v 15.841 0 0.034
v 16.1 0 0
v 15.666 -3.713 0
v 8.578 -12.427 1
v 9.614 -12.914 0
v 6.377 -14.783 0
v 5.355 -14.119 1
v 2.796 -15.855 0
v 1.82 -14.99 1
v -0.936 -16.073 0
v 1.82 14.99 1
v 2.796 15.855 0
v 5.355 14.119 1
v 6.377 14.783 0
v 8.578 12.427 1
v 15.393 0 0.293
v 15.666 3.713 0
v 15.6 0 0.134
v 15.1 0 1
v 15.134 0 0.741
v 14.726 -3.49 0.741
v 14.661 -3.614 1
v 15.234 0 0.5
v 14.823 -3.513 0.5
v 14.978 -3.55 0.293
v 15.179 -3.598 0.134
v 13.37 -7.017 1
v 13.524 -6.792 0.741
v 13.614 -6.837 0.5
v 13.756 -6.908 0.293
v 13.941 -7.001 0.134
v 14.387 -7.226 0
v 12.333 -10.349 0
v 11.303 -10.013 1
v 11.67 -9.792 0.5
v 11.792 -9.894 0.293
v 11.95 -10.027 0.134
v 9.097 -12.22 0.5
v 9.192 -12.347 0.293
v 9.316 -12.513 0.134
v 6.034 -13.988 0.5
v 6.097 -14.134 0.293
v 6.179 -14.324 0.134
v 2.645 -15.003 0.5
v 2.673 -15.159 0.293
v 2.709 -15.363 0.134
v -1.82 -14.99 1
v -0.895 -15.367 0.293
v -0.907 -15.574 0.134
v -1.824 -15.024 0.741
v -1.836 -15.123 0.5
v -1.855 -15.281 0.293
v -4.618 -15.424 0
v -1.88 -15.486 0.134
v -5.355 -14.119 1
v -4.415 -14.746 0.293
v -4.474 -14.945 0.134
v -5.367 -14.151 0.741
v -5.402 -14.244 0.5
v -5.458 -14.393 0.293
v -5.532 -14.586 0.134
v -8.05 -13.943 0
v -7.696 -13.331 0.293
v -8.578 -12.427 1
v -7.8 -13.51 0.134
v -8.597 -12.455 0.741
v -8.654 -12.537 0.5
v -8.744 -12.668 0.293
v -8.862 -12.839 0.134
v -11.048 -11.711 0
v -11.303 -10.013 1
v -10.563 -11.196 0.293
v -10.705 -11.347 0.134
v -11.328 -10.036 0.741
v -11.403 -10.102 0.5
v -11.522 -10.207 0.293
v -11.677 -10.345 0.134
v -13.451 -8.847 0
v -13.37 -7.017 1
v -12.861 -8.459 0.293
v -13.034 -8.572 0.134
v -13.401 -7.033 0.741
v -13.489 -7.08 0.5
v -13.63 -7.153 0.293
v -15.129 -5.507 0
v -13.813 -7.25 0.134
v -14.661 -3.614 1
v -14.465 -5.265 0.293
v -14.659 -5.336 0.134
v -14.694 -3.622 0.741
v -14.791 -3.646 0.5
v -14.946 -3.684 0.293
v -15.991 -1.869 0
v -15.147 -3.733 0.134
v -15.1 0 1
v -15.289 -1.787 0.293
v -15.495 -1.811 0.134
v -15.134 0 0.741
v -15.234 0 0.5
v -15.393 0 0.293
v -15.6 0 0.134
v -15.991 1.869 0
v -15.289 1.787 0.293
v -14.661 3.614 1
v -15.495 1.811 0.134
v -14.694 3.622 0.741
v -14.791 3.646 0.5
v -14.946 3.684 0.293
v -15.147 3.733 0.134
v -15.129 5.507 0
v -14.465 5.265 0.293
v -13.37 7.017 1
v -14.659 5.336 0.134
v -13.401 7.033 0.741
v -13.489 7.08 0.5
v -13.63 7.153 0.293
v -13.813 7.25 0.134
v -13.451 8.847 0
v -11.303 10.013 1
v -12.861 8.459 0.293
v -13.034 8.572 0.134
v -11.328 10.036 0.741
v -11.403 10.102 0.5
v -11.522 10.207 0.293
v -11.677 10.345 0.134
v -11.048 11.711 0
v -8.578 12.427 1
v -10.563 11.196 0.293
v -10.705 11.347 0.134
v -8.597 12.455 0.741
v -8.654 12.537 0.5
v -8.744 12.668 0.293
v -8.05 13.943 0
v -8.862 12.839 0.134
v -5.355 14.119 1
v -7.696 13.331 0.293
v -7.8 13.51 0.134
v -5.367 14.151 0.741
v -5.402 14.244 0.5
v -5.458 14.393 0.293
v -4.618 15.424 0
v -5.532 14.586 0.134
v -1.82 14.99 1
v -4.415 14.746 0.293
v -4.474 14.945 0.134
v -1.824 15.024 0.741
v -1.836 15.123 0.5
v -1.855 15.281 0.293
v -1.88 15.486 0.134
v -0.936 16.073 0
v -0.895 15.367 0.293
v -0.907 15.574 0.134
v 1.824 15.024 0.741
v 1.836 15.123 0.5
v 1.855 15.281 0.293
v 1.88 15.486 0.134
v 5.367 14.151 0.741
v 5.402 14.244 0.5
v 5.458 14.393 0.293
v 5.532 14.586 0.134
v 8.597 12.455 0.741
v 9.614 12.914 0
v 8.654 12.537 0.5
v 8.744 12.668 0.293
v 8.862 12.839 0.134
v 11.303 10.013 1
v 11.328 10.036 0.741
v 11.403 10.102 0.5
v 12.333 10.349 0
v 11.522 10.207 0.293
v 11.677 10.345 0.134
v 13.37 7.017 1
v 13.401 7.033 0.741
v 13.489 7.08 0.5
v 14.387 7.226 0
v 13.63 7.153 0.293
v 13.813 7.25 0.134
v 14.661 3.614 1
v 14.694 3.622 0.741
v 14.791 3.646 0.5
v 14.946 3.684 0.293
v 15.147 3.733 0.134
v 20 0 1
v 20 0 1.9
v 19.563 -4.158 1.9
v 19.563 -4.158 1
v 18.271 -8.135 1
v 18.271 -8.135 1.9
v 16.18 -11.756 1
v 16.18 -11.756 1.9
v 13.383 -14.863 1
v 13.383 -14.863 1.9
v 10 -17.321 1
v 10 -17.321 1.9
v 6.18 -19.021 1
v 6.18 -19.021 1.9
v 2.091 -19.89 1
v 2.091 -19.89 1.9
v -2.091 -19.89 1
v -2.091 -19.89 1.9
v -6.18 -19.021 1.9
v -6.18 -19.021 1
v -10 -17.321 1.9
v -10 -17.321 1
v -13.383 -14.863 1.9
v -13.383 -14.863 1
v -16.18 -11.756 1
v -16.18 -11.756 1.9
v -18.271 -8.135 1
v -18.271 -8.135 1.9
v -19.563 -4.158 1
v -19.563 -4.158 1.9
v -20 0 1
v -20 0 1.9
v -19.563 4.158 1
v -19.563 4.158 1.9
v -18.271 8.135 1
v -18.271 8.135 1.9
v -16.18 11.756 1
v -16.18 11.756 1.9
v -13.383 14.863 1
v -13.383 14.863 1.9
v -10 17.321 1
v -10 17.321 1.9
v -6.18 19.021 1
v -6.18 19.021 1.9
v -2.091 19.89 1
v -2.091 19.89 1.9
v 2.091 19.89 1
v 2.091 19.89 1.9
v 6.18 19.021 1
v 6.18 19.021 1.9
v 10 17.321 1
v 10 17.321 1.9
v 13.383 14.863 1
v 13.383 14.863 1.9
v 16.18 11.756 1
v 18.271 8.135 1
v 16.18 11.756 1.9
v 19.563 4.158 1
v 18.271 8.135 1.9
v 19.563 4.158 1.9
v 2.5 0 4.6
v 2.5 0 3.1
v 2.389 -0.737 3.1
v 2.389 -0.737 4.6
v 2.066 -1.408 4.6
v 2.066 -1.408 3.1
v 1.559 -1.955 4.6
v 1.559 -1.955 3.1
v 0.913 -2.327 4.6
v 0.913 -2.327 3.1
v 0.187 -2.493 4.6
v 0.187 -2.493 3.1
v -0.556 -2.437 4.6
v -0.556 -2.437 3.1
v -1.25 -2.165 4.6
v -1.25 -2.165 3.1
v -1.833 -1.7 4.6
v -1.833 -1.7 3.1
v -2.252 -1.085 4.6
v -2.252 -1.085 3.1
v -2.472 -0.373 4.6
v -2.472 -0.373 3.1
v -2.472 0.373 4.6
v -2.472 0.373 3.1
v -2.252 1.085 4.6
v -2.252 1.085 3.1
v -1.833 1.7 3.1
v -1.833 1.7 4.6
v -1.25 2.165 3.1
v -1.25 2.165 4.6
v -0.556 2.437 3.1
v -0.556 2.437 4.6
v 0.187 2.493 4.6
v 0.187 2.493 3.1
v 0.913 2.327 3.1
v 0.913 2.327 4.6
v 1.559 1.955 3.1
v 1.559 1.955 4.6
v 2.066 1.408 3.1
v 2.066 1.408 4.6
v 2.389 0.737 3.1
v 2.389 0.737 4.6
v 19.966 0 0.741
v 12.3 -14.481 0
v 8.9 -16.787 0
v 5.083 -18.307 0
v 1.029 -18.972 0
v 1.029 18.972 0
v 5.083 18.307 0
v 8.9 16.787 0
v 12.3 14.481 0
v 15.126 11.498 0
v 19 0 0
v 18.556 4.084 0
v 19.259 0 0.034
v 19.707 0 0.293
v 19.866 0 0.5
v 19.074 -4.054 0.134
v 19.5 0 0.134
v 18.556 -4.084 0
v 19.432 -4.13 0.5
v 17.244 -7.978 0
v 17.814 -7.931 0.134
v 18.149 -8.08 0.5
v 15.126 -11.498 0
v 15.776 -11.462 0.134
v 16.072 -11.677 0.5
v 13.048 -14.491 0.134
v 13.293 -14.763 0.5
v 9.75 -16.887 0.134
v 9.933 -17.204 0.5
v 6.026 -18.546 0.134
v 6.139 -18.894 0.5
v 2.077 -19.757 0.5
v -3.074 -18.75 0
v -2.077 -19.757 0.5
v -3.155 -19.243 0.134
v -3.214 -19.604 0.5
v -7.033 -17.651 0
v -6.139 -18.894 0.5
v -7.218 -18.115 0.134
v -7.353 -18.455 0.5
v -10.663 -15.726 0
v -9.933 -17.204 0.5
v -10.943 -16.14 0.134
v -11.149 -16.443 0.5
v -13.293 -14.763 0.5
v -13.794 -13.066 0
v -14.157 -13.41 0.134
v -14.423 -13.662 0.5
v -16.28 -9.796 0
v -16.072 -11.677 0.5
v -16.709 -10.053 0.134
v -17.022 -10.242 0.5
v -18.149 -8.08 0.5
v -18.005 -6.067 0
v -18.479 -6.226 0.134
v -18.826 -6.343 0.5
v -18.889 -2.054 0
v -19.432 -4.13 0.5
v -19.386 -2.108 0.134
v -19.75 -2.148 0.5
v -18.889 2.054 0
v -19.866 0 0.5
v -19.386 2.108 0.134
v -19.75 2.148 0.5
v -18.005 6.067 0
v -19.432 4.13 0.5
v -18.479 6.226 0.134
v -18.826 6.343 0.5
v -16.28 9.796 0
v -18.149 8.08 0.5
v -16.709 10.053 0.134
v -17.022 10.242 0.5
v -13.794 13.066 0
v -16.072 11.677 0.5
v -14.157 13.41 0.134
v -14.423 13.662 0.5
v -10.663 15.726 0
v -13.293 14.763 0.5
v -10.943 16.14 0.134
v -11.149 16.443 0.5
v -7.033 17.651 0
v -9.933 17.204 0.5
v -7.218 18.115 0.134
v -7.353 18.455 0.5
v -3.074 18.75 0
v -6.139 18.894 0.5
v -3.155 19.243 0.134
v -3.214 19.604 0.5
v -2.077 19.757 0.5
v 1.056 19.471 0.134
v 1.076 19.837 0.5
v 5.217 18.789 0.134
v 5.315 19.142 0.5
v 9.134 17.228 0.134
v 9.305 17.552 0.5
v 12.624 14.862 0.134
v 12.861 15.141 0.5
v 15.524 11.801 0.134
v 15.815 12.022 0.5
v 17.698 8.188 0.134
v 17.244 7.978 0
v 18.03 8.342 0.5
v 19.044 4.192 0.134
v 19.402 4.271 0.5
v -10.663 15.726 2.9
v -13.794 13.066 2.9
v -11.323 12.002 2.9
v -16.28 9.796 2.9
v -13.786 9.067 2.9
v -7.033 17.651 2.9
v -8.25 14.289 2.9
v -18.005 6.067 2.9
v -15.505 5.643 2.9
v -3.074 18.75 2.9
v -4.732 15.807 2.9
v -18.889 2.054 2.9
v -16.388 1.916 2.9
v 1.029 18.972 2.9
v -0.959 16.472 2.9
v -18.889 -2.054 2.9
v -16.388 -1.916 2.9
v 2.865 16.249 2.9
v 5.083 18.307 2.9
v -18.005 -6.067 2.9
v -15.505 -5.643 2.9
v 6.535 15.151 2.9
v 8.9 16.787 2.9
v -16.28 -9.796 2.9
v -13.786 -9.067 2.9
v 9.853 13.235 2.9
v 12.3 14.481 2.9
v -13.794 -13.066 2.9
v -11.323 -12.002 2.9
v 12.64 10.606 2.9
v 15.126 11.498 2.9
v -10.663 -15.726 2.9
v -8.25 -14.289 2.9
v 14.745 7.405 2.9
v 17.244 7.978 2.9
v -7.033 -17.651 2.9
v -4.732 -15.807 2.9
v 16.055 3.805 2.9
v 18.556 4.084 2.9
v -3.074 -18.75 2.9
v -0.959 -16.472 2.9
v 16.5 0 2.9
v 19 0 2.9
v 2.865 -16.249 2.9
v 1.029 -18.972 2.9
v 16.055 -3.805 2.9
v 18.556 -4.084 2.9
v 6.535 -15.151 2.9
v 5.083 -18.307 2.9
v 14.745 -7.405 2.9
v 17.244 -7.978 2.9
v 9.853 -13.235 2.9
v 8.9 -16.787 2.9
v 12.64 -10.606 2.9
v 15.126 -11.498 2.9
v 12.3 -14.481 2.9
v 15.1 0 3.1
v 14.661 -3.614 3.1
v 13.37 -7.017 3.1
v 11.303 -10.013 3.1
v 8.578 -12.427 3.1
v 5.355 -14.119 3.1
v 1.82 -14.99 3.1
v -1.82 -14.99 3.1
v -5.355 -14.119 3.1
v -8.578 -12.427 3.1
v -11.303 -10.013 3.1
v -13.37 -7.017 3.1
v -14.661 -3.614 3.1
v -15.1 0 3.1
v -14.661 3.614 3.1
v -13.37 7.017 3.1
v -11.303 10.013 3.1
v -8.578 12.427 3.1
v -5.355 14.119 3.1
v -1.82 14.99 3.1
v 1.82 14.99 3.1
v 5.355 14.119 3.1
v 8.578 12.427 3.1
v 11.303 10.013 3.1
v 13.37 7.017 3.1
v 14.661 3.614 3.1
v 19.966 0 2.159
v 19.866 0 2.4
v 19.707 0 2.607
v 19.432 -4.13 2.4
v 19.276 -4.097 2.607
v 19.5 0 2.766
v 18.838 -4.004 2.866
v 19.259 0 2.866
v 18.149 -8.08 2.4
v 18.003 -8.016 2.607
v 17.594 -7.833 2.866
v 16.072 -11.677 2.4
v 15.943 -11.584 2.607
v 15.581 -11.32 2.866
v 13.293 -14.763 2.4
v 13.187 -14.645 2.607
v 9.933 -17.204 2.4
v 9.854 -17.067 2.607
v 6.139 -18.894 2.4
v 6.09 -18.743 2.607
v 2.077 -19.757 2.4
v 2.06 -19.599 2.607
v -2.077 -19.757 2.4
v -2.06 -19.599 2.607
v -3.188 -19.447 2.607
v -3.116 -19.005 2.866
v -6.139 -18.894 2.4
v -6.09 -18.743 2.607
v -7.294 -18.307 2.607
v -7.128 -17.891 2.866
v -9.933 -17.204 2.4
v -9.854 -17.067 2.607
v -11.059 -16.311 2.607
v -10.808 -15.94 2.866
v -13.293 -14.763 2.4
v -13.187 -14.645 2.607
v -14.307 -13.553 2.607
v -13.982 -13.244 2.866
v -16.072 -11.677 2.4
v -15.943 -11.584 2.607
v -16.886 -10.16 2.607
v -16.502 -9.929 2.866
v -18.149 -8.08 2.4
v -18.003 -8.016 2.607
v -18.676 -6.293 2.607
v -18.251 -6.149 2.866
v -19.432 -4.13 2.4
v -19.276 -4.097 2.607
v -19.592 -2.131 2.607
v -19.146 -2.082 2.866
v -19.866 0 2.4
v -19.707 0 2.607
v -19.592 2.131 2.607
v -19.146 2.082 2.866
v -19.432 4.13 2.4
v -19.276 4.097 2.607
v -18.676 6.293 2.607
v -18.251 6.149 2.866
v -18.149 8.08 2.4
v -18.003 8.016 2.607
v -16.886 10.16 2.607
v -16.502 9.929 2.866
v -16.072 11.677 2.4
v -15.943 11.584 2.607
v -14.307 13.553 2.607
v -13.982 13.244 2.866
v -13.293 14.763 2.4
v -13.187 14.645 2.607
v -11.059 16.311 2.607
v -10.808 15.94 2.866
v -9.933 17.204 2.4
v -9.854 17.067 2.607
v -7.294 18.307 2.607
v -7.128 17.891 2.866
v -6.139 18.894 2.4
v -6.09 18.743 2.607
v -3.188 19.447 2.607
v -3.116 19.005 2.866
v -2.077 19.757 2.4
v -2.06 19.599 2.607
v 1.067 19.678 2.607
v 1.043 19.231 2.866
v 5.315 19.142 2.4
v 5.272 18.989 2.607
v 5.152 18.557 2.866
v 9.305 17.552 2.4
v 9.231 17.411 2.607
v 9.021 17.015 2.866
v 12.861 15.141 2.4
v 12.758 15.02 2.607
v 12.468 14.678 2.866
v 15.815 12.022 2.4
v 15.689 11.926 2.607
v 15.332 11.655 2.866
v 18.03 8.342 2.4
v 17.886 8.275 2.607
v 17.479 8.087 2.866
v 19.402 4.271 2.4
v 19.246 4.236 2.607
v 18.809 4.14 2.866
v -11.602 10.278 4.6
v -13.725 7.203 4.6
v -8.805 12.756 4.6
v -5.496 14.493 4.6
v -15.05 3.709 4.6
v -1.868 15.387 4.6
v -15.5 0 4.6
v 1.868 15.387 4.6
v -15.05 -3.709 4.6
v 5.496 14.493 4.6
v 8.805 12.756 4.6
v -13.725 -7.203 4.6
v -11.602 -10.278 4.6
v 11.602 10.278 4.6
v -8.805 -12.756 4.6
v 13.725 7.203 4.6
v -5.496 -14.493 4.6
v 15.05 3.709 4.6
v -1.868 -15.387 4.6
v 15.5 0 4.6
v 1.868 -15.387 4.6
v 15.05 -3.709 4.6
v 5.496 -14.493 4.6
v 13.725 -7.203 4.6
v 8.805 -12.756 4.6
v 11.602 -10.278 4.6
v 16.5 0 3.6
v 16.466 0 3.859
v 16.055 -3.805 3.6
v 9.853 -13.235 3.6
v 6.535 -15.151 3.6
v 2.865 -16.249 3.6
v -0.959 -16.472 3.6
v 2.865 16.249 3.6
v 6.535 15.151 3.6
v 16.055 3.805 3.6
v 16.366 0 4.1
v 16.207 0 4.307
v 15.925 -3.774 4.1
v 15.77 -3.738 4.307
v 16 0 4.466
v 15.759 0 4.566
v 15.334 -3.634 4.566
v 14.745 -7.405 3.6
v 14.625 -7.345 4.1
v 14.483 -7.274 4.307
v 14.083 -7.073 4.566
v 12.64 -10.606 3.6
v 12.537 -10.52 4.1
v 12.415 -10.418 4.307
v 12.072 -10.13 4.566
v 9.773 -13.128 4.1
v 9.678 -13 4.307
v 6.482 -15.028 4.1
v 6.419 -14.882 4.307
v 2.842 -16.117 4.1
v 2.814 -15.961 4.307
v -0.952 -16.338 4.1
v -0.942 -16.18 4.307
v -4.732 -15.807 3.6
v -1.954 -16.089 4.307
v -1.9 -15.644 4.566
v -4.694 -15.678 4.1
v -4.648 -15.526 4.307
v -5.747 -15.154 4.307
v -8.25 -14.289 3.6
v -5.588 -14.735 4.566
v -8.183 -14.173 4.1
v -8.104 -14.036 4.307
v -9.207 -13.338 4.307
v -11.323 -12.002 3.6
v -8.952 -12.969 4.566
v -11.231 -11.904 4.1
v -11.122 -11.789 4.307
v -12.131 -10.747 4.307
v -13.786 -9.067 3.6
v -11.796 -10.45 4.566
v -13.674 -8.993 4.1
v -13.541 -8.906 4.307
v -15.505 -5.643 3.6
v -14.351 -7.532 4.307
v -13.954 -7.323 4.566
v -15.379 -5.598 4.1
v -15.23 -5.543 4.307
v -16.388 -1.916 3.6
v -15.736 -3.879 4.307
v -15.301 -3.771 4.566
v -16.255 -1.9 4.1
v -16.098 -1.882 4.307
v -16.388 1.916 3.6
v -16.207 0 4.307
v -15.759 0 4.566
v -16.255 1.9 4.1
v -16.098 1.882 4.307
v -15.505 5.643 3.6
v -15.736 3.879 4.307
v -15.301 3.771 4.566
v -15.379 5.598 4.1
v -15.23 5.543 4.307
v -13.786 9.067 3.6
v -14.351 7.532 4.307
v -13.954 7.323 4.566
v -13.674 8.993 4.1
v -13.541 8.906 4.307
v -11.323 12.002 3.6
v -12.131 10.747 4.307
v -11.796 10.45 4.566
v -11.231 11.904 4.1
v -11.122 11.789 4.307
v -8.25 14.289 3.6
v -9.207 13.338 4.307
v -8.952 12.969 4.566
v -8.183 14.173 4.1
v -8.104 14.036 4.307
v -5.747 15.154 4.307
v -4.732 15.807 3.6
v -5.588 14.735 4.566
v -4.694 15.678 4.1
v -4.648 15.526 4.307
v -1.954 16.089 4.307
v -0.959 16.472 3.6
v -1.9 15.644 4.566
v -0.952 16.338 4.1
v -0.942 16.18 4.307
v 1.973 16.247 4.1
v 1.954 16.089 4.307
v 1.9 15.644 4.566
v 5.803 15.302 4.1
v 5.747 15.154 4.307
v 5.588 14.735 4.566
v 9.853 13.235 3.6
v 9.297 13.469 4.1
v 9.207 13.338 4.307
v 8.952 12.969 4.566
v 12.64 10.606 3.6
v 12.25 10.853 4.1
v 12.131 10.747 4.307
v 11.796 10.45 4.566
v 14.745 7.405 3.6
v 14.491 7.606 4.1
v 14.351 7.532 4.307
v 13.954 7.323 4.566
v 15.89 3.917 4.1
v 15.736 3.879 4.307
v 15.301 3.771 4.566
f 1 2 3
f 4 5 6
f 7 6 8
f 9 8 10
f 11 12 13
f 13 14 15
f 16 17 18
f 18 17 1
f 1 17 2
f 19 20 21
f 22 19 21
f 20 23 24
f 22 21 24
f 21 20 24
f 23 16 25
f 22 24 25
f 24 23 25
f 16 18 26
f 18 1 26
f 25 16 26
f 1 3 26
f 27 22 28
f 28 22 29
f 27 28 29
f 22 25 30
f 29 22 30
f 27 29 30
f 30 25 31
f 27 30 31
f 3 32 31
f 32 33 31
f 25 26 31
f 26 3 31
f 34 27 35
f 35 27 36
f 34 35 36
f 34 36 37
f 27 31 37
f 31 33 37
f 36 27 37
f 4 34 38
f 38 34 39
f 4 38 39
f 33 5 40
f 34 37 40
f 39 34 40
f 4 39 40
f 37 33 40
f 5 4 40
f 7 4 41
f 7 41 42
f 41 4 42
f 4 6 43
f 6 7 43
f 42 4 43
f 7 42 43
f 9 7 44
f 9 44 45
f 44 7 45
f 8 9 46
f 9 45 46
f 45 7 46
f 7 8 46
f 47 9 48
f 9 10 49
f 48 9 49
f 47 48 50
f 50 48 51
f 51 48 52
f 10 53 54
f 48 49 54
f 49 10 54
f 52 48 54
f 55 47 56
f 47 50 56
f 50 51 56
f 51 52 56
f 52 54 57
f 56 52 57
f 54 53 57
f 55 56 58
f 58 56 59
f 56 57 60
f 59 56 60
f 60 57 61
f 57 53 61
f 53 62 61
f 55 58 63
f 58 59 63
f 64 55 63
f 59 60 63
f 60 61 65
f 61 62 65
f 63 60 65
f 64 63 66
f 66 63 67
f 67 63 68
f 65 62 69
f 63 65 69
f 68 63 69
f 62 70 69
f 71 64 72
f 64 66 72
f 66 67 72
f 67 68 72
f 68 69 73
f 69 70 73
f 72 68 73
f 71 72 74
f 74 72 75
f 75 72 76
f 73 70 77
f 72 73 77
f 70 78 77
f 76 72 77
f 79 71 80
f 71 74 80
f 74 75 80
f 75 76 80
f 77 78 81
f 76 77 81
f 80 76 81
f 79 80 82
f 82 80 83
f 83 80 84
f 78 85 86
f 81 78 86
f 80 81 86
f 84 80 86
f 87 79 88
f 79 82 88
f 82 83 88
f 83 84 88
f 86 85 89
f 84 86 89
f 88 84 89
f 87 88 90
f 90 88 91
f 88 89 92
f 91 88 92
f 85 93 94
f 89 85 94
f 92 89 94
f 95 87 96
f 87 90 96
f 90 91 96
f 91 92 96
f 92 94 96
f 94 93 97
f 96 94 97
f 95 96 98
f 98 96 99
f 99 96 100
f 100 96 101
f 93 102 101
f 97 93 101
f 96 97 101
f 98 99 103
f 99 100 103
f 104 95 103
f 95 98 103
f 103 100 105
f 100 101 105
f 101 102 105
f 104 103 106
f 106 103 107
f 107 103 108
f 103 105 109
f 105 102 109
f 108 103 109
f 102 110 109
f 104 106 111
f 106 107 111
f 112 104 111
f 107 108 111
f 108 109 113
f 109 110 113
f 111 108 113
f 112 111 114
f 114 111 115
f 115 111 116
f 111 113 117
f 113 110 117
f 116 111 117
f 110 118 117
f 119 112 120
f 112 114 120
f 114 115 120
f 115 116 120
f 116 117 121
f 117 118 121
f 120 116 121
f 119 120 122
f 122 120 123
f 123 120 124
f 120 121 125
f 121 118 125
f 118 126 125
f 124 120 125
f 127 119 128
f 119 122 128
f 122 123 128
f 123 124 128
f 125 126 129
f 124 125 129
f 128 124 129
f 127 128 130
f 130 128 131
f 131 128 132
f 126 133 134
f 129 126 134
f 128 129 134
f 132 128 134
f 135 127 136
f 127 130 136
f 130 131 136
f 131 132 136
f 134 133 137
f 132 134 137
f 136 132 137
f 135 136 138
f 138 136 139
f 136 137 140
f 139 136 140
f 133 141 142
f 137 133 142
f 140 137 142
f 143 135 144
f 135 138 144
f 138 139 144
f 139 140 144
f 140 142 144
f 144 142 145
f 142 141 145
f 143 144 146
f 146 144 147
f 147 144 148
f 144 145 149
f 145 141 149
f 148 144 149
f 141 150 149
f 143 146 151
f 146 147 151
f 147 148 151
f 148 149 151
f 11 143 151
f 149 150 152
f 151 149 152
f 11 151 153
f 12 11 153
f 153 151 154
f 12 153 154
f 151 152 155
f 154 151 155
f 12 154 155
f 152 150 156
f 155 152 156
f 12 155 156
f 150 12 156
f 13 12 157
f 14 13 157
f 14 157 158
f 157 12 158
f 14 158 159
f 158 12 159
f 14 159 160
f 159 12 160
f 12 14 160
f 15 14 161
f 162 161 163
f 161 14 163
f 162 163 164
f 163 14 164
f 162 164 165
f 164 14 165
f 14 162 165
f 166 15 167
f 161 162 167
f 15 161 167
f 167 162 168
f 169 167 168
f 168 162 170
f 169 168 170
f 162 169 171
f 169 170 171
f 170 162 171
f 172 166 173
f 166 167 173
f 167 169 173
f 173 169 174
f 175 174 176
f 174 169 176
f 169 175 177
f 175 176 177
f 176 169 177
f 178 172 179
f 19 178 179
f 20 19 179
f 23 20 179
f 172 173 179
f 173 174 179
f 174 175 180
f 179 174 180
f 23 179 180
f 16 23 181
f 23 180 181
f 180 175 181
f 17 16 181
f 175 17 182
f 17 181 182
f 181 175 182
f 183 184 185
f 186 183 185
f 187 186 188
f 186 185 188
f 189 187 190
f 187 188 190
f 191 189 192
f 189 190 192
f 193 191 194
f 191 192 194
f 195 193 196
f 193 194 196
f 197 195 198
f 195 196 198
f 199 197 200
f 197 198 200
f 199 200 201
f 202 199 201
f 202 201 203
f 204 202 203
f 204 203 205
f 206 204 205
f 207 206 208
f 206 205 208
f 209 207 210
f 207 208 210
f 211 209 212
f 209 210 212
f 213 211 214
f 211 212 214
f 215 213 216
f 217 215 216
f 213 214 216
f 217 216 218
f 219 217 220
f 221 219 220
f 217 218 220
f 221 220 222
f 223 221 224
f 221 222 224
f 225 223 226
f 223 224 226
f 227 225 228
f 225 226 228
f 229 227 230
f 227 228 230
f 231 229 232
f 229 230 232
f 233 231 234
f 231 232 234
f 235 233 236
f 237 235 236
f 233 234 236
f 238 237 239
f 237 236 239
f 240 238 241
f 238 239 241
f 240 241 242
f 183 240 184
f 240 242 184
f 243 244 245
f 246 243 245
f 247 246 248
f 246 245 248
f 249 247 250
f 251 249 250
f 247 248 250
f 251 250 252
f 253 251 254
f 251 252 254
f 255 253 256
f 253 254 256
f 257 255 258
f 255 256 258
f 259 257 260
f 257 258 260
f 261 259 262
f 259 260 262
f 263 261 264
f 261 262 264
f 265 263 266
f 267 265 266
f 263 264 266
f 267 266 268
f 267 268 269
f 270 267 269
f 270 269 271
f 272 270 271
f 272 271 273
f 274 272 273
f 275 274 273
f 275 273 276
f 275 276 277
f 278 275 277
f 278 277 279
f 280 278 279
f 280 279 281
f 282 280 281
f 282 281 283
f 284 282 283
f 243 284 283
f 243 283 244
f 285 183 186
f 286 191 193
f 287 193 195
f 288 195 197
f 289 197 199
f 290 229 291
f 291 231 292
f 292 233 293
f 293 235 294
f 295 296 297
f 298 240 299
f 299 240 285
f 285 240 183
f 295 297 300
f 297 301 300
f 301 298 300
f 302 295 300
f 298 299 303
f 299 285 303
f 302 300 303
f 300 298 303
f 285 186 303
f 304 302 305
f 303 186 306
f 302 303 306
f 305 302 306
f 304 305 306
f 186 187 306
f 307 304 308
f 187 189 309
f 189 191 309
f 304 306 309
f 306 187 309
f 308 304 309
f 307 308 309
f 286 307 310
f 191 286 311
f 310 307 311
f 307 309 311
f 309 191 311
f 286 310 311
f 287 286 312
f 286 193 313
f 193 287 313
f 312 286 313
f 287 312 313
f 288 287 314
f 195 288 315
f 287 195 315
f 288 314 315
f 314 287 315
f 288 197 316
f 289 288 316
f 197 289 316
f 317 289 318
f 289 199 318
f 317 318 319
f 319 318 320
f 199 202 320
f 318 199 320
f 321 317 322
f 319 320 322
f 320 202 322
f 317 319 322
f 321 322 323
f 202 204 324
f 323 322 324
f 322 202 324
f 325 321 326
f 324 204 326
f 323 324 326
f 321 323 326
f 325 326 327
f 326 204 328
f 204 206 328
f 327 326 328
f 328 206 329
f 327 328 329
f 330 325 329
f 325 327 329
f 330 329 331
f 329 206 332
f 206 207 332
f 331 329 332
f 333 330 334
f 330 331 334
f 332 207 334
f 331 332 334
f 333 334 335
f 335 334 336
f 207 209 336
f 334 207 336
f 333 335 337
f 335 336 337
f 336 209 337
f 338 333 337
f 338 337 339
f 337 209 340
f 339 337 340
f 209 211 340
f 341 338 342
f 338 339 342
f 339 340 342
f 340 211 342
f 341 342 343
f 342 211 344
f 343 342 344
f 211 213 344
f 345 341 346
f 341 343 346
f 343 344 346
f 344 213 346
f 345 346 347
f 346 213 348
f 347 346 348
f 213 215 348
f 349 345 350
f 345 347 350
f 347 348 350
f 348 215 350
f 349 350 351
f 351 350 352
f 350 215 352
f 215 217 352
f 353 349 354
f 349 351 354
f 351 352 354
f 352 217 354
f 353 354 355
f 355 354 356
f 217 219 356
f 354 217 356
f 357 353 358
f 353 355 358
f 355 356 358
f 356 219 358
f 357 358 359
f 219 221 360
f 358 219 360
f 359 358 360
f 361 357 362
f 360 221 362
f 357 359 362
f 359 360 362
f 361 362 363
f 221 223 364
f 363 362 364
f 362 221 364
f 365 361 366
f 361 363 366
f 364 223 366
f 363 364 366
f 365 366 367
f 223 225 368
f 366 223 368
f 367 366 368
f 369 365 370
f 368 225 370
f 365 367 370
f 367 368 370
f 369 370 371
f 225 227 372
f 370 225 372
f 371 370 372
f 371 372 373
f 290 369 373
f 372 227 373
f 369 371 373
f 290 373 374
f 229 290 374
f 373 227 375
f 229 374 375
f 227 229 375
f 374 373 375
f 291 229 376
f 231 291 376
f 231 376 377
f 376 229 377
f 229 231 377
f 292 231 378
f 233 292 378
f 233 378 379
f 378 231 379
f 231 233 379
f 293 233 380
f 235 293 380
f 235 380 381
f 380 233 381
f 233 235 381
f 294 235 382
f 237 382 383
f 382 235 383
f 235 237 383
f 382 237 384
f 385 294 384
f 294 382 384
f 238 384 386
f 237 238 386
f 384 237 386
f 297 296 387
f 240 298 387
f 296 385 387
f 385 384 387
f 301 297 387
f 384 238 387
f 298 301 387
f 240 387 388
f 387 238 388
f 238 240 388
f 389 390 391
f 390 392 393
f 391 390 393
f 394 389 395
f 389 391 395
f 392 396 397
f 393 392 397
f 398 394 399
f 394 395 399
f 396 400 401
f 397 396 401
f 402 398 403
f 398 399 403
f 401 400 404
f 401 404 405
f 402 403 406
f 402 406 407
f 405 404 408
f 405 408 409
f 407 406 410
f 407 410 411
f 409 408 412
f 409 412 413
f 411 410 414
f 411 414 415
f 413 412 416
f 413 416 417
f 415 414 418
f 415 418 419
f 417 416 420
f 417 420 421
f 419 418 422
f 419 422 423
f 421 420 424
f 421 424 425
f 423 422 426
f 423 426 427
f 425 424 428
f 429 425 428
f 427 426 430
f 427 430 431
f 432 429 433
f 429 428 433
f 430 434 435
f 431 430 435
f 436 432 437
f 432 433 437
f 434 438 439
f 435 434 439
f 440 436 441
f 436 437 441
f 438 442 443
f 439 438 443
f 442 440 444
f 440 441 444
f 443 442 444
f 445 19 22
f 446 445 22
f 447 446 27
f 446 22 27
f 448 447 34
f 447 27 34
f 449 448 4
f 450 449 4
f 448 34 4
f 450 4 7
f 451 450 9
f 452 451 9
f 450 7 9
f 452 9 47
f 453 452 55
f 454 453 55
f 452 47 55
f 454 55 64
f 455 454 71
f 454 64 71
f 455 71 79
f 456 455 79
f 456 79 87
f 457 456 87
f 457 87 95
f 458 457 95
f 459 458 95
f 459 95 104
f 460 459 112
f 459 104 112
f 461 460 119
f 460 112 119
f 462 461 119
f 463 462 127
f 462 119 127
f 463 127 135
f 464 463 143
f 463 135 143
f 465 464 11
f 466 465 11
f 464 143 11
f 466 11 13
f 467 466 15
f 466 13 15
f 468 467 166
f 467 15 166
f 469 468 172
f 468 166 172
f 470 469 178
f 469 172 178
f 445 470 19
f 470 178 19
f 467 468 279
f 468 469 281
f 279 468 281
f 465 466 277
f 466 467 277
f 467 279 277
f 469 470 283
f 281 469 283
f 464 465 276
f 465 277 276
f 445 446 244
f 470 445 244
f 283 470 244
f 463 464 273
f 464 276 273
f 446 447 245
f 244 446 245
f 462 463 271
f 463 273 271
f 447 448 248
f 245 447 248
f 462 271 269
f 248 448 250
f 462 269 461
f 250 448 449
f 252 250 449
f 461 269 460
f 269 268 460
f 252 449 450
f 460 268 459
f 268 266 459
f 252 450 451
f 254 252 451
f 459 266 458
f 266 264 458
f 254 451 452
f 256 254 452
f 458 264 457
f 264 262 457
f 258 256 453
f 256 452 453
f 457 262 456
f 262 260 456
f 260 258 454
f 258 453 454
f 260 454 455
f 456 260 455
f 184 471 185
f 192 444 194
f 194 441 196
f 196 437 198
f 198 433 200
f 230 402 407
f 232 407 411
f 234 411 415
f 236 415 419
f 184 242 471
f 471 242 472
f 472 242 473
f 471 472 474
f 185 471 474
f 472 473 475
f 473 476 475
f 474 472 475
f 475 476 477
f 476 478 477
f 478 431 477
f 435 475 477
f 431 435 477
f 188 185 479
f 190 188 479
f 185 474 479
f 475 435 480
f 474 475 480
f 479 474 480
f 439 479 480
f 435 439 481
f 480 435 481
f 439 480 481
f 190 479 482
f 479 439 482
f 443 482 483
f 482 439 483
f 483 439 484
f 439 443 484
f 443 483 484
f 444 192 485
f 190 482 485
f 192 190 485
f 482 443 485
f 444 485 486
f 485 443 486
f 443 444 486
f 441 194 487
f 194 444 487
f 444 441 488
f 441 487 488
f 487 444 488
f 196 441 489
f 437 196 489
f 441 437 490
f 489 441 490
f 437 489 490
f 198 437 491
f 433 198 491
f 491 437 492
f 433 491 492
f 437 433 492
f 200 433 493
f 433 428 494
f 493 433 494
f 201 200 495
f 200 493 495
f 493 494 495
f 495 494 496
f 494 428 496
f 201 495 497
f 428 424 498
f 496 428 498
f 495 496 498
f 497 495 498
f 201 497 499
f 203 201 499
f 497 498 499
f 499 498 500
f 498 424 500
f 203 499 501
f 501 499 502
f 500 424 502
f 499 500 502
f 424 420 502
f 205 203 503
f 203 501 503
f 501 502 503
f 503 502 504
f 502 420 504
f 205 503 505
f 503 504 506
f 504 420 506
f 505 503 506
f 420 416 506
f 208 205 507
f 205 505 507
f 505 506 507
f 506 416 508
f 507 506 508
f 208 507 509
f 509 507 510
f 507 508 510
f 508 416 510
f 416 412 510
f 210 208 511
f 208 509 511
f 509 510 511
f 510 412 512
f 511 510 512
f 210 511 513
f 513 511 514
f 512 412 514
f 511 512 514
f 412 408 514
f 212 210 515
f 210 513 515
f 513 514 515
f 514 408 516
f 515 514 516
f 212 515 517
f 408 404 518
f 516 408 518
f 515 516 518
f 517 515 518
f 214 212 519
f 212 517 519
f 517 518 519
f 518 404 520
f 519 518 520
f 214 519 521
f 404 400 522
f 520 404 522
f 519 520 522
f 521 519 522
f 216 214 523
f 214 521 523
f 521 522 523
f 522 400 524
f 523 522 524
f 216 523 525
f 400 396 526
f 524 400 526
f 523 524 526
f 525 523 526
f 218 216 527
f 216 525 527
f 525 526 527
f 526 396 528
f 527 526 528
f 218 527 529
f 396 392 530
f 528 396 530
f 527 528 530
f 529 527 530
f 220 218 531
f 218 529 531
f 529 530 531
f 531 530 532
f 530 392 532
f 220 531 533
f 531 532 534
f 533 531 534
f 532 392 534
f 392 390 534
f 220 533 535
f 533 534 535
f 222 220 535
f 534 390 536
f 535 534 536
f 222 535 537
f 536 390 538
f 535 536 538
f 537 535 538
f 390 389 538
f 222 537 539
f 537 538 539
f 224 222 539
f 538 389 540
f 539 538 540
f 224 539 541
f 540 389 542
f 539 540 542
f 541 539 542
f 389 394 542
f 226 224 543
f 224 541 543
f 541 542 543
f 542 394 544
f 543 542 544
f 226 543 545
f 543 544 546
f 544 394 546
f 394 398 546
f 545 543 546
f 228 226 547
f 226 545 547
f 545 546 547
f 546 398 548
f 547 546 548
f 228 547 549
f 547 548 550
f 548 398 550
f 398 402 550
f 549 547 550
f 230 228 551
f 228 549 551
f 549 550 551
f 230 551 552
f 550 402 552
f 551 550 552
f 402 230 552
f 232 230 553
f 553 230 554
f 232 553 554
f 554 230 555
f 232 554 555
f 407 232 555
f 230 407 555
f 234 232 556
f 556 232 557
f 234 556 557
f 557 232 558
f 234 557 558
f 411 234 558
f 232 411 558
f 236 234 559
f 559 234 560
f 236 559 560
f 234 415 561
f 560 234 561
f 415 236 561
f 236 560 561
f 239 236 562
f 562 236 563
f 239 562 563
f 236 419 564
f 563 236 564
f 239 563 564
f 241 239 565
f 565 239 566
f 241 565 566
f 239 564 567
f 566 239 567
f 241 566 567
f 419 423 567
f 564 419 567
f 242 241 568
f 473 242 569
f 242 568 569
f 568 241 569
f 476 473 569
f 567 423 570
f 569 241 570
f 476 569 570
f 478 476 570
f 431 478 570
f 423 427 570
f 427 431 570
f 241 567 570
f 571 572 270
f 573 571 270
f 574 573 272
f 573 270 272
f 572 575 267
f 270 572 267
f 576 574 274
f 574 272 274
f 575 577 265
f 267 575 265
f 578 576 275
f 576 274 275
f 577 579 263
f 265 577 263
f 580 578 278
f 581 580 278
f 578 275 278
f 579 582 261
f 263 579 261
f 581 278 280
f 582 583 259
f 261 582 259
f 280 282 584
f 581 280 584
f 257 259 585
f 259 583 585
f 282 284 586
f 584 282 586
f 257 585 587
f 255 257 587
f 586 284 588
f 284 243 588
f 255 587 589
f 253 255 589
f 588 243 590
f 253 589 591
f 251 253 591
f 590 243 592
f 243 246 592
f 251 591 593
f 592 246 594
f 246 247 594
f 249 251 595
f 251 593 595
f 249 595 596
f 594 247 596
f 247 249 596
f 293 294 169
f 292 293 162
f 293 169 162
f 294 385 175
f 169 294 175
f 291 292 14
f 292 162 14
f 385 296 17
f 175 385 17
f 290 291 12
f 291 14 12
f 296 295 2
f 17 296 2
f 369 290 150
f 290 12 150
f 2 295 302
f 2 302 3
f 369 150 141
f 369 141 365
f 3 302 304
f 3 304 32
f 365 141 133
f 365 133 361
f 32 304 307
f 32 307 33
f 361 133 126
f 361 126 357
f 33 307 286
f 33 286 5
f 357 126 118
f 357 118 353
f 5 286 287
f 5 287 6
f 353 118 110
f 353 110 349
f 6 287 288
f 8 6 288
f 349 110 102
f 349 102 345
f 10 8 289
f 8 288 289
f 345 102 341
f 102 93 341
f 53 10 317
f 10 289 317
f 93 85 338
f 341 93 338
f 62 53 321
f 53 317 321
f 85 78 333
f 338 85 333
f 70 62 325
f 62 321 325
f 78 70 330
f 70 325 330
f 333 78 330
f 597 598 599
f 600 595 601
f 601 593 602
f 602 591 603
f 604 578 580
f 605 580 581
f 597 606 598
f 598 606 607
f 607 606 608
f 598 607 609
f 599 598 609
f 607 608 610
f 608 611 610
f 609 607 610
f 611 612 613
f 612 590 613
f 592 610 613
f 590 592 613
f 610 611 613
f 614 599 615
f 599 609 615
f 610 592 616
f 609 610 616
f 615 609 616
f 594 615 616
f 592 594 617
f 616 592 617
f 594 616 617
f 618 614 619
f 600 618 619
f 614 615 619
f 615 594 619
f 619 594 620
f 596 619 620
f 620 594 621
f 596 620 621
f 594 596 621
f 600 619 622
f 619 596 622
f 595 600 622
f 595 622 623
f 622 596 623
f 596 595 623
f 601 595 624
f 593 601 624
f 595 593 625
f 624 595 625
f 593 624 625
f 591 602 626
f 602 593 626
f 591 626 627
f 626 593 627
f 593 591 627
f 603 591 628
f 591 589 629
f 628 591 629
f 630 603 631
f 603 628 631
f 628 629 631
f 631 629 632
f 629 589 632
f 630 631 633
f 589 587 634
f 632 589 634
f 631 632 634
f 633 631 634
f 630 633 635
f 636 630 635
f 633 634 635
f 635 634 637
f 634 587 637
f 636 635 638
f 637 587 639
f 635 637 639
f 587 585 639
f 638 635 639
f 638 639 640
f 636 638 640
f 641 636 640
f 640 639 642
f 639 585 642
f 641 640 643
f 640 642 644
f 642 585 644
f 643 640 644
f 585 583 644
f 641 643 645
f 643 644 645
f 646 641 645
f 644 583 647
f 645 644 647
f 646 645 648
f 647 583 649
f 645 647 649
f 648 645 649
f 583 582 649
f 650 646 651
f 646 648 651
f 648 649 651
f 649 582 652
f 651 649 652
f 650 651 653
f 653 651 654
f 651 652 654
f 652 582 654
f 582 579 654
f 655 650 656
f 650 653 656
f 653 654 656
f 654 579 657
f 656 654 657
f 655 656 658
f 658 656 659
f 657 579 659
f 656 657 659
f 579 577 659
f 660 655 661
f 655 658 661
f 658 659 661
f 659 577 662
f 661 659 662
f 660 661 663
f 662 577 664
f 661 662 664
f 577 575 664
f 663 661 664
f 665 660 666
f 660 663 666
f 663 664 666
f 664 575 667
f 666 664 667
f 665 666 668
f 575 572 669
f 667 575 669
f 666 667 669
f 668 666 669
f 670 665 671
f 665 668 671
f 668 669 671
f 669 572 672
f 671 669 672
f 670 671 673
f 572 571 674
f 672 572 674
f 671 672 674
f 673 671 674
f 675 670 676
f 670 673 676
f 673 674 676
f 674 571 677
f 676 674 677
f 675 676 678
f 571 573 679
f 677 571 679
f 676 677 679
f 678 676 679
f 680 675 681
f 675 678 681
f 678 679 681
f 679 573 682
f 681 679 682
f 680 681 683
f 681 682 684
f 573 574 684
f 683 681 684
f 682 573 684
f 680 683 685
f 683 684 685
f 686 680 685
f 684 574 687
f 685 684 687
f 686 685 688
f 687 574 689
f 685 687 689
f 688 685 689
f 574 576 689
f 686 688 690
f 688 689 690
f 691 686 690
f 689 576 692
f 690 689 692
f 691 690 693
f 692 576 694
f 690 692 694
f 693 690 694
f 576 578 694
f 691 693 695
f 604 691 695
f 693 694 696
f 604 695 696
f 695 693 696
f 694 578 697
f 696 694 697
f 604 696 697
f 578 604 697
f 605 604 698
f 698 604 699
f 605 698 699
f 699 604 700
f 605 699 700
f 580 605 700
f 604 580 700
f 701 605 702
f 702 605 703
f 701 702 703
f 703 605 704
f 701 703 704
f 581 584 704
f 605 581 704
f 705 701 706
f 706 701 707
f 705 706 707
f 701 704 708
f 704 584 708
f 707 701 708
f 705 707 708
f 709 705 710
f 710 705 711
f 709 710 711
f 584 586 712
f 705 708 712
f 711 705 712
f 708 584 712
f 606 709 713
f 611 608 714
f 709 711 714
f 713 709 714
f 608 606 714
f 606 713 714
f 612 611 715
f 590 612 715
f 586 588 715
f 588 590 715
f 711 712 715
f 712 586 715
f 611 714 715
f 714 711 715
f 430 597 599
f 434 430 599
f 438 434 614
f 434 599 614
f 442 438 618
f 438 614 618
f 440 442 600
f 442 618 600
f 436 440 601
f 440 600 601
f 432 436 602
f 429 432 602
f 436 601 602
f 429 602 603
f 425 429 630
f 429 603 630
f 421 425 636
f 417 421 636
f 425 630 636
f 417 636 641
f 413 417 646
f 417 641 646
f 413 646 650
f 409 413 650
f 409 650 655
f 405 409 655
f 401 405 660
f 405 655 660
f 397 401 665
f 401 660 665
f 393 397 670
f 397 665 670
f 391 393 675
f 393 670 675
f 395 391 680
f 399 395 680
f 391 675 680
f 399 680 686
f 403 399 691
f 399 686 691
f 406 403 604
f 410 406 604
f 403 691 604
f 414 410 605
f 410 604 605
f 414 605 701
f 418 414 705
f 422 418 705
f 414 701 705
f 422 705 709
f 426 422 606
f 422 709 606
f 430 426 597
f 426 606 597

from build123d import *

# Parameters (mm, degrees)
F2_R     = 1
F3_R     = 2.5
F4_DEPTH = 1.501


# Not quite as in the source:
# - a feature names something its author has since deleted; it is built from what else it names


with BuildPart() as f1:
    # F0 (on Front) → F1 (revolve)
    with BuildSketch(Plane.XZ):
        Polygon((15.1, 3.1), (15.1, 0), (20, 0), (20, 2.9), (16.5, 2.9), (16.5, 4.6), (0, 4.6), (0, 3.1), align=None)
    revolve(axis=Axis((0, 0, 3.0650238041), (0, 0, -1)))

    # F2
    f2_edges = [f1.edges().sort_by_distance(p)[0] for p in [
        (-15.1, 0, 0),
        (-20, 0, 0),
        (-16.5, 0, 4.6),
        (-20, 0, 2.9),
    ]]
    fillet(f2_edges, radius=F2_R)

    # F3 (on face) → F4 (cut, through all)
    with BuildSketch(Plane(origin=(0, 0, 3.1), x_dir=(1, 0, 0), z_dir=(0, 0, -1))):
        Circle(F3_R)
    extrude(amount=-F4_DEPTH, mode=Mode.SUBTRACT)


solid = f1.part
